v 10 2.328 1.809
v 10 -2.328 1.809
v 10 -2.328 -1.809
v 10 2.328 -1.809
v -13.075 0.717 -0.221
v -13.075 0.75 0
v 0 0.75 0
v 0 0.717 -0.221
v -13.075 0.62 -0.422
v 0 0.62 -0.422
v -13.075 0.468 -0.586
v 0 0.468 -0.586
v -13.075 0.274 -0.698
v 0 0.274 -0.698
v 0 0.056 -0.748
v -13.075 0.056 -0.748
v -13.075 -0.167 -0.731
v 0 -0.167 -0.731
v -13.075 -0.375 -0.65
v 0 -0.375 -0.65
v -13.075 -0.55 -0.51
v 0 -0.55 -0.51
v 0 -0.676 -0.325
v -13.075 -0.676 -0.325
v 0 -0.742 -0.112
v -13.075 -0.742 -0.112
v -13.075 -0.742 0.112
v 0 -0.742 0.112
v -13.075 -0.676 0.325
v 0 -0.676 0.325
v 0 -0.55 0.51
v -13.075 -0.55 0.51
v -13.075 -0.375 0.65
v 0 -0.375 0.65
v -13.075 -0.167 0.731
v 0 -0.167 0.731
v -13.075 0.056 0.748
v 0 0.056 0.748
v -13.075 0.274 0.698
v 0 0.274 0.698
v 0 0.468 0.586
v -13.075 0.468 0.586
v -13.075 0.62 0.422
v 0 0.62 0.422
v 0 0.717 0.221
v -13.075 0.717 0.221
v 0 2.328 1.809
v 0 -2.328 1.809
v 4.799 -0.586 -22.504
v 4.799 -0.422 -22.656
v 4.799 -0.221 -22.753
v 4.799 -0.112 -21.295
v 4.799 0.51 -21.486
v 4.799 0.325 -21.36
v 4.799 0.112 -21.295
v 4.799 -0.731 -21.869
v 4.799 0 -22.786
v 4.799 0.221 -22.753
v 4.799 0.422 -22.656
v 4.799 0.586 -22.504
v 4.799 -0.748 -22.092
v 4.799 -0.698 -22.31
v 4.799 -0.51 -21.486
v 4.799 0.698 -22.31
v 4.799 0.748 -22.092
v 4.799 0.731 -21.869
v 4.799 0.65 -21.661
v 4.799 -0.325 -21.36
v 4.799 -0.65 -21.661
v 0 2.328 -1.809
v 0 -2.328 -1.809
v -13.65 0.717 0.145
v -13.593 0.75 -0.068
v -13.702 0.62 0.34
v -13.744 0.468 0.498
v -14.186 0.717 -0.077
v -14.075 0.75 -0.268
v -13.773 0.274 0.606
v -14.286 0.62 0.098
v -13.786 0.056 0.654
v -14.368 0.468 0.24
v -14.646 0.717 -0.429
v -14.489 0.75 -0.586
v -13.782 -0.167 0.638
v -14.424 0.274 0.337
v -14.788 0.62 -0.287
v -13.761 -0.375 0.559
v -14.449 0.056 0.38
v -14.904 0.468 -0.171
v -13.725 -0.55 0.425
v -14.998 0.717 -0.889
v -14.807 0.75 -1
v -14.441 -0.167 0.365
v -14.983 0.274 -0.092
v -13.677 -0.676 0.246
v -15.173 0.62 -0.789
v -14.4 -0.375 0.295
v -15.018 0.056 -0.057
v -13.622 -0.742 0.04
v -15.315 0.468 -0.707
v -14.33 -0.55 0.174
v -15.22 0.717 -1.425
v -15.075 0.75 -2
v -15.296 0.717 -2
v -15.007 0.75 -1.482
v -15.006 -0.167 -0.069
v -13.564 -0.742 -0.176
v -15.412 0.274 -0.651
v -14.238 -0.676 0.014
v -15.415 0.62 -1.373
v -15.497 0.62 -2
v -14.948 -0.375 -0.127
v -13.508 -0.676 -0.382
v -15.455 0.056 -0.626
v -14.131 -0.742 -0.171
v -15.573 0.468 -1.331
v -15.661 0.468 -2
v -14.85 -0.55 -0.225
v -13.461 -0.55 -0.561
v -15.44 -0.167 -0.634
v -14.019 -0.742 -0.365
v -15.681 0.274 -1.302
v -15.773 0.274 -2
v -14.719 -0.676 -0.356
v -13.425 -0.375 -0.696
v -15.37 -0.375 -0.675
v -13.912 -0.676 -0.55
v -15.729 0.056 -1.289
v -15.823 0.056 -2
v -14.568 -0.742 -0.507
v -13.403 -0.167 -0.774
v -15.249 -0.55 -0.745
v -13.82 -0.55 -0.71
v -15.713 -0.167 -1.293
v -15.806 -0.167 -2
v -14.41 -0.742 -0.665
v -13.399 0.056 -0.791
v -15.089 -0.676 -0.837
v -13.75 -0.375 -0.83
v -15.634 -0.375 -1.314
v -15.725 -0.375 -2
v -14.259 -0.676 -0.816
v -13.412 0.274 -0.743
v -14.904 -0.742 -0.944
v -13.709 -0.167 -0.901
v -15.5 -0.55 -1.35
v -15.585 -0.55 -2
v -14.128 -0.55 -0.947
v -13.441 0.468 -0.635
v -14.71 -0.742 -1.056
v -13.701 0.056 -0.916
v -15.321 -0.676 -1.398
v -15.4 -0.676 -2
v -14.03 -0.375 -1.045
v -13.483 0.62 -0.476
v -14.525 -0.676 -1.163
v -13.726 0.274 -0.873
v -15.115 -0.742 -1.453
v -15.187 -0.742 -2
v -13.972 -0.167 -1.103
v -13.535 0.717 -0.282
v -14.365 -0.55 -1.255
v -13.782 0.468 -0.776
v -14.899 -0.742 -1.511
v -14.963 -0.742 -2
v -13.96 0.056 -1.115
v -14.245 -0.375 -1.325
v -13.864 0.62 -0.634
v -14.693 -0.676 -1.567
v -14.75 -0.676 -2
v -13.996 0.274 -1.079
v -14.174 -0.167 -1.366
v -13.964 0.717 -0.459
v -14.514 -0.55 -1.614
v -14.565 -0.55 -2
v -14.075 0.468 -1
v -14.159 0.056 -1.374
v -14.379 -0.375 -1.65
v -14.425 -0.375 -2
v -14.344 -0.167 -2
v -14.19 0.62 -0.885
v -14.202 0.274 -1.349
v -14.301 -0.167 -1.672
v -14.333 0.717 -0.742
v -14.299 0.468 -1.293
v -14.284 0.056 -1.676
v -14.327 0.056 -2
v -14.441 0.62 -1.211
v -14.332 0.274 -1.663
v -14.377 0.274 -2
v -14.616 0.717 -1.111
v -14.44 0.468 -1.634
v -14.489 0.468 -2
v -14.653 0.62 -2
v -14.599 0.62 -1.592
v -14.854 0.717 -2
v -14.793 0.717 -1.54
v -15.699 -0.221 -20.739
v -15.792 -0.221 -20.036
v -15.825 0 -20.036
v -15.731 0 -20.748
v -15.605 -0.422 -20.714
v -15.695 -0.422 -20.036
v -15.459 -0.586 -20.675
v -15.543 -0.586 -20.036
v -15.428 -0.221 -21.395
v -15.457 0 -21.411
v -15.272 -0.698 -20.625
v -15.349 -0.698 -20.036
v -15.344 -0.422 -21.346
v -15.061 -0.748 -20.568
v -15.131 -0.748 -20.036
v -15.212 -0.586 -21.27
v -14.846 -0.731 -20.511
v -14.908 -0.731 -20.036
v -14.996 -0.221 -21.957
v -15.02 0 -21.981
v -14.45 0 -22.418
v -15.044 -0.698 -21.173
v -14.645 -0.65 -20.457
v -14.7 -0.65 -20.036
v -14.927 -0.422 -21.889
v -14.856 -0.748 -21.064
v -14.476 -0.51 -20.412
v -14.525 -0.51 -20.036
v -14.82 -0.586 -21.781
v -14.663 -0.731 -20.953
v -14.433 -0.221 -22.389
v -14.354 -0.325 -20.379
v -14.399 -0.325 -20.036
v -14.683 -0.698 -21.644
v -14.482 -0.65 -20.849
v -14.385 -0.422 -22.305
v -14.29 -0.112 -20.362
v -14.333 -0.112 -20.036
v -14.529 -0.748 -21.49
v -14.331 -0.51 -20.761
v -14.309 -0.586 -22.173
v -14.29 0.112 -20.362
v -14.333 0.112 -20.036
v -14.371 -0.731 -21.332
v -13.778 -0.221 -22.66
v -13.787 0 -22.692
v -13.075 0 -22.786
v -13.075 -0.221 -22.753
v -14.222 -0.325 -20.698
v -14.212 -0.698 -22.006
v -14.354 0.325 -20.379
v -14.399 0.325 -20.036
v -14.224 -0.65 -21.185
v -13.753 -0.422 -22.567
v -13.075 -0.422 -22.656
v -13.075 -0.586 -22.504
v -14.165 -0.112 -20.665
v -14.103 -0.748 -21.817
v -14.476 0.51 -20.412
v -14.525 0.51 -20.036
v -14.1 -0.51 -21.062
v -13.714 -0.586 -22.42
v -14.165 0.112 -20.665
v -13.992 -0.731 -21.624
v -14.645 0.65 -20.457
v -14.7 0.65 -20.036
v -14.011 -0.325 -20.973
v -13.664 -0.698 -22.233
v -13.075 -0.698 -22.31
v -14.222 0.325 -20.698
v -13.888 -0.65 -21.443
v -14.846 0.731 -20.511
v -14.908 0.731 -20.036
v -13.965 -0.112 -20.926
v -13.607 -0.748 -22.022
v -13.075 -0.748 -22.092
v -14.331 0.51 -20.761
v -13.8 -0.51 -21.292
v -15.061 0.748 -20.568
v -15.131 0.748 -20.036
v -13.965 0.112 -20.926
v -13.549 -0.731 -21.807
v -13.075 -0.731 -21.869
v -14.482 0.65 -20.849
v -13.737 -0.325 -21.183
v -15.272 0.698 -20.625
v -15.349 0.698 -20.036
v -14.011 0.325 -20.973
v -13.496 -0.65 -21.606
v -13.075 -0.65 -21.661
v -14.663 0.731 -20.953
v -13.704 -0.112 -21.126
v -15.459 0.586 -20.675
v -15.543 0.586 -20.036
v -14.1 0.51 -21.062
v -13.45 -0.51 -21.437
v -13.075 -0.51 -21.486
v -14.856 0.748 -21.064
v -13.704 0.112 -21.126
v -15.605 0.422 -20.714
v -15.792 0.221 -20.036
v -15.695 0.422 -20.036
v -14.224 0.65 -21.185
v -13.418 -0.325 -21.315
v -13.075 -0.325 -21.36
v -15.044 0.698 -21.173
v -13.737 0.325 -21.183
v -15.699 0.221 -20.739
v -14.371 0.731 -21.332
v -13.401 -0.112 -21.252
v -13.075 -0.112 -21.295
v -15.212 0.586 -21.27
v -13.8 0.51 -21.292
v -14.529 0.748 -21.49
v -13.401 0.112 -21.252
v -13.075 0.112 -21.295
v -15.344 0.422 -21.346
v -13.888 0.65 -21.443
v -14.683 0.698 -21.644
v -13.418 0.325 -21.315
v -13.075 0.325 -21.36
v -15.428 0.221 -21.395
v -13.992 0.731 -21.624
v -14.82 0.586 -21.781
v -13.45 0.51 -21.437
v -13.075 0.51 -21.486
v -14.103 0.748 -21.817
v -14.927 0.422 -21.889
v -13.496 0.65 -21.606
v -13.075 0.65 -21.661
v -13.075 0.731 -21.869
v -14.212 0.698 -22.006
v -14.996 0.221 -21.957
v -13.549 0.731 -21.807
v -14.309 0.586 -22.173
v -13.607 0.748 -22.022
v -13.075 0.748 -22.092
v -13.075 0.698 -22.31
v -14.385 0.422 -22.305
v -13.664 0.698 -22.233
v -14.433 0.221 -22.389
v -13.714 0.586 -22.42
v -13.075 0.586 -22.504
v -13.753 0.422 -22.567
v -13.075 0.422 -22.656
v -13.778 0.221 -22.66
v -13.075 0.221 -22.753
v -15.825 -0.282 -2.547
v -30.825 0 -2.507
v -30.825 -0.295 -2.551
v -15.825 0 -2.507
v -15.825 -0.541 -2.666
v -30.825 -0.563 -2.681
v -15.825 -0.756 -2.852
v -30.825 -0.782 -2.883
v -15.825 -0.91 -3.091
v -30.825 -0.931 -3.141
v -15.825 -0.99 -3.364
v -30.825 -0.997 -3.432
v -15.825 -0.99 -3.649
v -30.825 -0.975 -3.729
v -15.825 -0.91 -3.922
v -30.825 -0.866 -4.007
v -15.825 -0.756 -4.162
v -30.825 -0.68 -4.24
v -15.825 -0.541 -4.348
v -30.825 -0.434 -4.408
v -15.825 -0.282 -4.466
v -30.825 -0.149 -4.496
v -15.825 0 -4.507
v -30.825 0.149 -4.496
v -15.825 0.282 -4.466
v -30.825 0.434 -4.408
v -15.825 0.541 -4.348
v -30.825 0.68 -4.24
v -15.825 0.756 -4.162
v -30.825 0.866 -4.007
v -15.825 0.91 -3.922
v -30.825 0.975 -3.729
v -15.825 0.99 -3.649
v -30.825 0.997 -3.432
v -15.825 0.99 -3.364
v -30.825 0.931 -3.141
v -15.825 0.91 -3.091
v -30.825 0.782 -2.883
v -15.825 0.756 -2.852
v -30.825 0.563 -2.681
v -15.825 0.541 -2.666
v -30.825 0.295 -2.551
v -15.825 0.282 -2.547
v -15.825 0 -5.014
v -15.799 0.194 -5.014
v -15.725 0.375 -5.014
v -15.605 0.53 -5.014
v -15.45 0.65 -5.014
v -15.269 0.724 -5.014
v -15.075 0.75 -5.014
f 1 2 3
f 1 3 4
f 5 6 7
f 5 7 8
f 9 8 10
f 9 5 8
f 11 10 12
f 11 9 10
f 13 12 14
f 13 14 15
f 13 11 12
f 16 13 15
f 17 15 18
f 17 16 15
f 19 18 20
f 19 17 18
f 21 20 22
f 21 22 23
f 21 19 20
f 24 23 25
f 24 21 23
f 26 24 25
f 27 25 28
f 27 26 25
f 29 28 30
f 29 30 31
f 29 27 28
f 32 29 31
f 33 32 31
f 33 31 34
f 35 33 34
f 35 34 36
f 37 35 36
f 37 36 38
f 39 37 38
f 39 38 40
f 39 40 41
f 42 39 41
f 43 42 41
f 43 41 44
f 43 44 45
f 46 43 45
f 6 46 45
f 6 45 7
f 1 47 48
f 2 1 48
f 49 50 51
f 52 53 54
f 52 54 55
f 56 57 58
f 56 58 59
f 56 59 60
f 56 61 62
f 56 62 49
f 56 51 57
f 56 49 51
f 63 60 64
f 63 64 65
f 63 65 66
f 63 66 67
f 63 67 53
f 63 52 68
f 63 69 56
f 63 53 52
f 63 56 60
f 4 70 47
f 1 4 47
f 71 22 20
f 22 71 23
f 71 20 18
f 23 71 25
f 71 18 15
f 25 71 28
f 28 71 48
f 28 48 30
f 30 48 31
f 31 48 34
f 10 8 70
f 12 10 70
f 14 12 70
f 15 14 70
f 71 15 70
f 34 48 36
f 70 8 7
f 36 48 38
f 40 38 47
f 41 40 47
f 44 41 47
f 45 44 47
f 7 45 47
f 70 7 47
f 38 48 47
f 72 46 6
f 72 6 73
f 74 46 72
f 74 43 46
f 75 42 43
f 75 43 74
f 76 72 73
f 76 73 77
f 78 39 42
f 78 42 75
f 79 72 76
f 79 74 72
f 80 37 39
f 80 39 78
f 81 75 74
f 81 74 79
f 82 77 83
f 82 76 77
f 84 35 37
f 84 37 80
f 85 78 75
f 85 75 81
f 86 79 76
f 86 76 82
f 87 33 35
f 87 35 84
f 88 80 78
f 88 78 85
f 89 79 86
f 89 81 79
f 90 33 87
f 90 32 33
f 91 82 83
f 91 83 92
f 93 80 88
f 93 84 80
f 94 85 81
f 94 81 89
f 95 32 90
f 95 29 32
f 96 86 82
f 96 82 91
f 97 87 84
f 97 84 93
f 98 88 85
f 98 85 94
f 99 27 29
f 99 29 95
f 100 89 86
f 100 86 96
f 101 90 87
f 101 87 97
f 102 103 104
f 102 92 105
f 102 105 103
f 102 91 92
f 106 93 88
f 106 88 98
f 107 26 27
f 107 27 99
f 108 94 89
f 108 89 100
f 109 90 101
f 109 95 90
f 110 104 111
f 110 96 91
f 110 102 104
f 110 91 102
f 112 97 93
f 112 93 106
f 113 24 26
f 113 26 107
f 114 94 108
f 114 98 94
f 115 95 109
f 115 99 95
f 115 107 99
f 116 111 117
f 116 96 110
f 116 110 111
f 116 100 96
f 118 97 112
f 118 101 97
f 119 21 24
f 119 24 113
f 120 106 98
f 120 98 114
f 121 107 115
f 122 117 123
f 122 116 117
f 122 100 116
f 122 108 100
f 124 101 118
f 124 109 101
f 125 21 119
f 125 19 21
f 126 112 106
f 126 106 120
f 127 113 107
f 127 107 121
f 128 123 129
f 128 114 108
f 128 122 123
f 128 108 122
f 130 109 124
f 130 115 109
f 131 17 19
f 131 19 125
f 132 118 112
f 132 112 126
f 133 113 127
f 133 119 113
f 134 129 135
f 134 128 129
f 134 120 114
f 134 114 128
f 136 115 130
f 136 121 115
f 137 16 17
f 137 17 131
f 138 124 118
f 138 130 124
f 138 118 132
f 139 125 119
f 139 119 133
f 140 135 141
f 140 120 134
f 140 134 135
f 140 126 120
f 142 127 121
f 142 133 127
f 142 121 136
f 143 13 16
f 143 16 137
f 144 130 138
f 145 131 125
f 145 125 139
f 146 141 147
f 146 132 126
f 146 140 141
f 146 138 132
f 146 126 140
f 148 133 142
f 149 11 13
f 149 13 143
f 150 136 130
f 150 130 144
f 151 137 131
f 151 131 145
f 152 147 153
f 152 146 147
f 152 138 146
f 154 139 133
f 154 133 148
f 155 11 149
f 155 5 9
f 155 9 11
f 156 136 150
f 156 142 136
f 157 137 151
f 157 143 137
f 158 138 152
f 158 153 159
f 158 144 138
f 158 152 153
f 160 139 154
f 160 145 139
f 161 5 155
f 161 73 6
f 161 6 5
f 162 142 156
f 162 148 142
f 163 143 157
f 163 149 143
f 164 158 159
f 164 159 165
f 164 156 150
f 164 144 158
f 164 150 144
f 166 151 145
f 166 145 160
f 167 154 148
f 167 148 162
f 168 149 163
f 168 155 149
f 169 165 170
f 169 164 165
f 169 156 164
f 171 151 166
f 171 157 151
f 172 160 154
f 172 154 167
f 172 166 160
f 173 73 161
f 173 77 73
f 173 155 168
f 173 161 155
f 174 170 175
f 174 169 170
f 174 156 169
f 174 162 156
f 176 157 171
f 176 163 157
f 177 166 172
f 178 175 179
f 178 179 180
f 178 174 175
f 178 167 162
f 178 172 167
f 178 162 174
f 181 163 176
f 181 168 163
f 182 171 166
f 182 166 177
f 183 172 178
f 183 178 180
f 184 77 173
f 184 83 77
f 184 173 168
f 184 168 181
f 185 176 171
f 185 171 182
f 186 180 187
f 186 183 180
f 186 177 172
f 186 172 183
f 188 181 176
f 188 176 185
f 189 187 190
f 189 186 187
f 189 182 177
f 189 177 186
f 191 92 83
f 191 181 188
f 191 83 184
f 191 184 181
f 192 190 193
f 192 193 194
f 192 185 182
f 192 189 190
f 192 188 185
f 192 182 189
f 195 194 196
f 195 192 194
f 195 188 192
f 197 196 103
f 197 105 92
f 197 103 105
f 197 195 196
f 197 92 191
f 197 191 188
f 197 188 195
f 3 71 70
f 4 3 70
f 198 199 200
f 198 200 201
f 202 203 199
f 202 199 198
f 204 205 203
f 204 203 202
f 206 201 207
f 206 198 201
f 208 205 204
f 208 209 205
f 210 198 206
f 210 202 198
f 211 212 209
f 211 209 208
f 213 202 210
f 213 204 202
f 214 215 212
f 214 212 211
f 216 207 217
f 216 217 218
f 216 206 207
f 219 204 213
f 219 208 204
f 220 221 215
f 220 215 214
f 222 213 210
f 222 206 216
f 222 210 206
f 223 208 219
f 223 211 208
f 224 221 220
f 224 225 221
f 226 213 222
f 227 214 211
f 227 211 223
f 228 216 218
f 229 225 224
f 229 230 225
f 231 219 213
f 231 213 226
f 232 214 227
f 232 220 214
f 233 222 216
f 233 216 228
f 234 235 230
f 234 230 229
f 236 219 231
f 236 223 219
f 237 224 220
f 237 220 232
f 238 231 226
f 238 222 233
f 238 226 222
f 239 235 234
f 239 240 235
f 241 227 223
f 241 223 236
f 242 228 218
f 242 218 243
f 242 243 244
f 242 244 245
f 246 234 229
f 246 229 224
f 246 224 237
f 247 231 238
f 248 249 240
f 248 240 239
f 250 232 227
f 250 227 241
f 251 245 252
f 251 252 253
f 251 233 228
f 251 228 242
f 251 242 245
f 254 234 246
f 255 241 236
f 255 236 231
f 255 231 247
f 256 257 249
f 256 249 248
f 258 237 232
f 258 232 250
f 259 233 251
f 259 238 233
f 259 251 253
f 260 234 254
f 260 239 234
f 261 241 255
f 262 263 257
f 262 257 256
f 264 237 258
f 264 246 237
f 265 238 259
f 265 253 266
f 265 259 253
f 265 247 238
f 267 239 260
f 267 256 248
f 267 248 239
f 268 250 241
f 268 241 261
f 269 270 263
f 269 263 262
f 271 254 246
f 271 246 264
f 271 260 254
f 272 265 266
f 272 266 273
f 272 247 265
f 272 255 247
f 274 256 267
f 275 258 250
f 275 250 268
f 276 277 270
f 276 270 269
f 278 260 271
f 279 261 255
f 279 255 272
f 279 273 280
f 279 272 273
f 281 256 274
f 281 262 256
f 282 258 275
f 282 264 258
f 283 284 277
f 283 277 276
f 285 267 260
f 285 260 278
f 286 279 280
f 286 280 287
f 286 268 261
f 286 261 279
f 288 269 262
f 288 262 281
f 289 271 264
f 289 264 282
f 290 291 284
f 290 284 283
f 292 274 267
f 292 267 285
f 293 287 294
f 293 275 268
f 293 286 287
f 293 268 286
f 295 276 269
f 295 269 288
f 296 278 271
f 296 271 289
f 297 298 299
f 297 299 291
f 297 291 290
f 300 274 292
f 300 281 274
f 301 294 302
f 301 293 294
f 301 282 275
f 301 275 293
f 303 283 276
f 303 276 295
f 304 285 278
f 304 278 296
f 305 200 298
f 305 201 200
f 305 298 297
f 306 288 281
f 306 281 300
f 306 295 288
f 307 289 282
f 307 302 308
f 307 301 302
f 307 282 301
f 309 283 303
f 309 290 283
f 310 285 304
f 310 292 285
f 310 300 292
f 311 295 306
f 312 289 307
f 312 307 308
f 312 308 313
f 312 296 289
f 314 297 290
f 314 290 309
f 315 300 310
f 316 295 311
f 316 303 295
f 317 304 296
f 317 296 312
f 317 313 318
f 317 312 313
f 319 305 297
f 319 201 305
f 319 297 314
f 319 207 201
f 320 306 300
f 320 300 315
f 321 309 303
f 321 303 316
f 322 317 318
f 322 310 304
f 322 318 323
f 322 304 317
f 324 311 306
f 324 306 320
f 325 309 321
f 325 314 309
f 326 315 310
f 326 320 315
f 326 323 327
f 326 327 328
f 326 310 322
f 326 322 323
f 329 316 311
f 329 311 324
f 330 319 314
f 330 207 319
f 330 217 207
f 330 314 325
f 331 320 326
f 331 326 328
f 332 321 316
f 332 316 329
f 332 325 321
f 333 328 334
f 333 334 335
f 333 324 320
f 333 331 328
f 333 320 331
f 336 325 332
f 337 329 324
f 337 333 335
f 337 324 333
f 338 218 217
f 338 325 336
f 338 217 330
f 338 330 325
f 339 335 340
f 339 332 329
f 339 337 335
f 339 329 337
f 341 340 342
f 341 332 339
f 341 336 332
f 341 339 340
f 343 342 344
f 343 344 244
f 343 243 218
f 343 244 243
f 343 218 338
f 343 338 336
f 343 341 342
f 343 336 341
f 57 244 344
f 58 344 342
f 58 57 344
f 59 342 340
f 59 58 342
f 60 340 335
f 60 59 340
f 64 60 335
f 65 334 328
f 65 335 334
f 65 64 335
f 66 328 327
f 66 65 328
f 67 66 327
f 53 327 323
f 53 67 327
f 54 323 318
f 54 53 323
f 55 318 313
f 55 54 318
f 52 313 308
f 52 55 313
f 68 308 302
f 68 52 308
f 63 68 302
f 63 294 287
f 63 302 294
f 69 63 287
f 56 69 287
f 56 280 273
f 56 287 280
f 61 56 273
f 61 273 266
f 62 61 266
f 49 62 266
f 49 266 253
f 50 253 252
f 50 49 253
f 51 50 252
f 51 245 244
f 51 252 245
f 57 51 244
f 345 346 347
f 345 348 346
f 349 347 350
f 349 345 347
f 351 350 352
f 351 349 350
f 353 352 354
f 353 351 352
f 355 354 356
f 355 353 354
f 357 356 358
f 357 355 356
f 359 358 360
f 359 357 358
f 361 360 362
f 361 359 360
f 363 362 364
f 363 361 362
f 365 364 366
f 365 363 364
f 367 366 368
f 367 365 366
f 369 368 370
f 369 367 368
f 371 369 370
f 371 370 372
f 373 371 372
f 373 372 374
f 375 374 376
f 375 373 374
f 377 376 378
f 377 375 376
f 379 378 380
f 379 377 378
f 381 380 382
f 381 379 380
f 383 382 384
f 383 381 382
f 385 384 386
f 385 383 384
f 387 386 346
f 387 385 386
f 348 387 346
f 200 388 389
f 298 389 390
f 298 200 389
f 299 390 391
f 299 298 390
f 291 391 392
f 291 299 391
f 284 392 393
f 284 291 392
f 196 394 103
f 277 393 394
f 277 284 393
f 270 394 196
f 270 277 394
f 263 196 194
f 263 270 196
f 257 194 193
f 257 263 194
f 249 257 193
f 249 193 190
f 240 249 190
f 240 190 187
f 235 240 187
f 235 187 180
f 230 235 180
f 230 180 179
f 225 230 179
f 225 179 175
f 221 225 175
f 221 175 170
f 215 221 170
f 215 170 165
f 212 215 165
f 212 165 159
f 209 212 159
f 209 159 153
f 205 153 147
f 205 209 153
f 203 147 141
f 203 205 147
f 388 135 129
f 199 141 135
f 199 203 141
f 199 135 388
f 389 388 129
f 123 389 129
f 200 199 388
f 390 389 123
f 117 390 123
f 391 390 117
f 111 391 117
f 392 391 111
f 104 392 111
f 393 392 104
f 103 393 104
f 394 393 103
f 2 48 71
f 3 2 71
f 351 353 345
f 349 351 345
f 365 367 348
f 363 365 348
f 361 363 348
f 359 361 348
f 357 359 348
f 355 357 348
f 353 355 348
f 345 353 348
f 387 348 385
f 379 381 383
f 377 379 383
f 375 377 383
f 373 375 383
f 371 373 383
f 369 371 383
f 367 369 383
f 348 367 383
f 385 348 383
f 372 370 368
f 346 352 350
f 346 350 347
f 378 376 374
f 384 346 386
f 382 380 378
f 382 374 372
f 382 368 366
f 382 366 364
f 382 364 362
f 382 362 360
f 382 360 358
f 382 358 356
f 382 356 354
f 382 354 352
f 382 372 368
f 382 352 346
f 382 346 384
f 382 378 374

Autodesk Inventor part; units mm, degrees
ref_plane "YZ Plane" through (0, 0, 0) normal (1, 0, 0) x (0, 1, 0)
ref_plane "XZ Plane" through (0, 0, 0) normal (0, 1, 0) x (-1, 0, 0)
ref_plane "XY Plane" through (0, 0, 0) normal (0, 0, 1) x (1, 0, 0)
sketch "草圖1" plane through (0, 0, 0) normal (1, 0, 0) x (0, 1, 0)
  circle A0 centre (0, 0) radius 0.75
  dimension "d0" = 1.5
sketch "草圖2" plane through (0, 0, 0) normal (0, 1, 0) x (-1, 0, 0)
  line L0 (0, 0) -> (13.075, 0)
  line L1 (15.075, -2) -> (15.075, -5.0136)
  arc A0 (15.075, -2) -> (13.075, 0) centre (13.075, -2) ccw
  point P0 (15.075, 0)
  dimension "d3" = 2
sweep "掃掠1" add profiles "草圖1" path "草圖2"
sketch "草圖3" plane through (0, 0, 0) normal (1, 0, 0) x (0, 1, 0)
  line L0 (-2.3279, -1.8091) -> (2.3279, -1.8091)
  line L1 (2.3279, -1.8091) -> (2.3279, 1.8091)
  line L2 (2.3279, 1.8091) -> (-2.3279, 1.8091)
  line L3 (-2.3279, 1.8091) -> (-2.3279, -1.8091)
  line L4 (-2.3279, -1.8091) -> (2.3279, 1.8091) construction
  line L5 (2.3279, -1.8091) -> (-2.3279, 1.8091) construction
  point P0 (0, 0)
sketch "草圖4" plane through (0, 0, 0) normal (0, 1, 0) x (-1, 0, 0)
  line L0 (15.825, -3.5068) -> (30.825, -3.5068)
  line L1 (30.825, -3.5068) -> (30.825, -2.5068)
  line L2 (30.825, -2.5068) -> (15.825, -2.5068)
  line L3 (15.825, -2.5068) -> (15.825, -3.5068)
  line L4 (15.825, -2) -> (15.825, -5.0136) projected
  point P0 (0, 0)
  point P1 (15.825, -3.0068)
  dimension "d4" = 1
  dimension "d5" = 15
revolve "迴轉1" add sketch "草圖4" angle 360 about axis through (-15.825, 0, -3.5068) along (-1, 0, 0)
extrude "擠出1" add sketch "草圖3" along normal blind 10
sketch "草圖5" plane through (0, 0, 0) normal (0, 1, 0) x (-1, 0, 0)
  line L0 (14.325, -5.0136) -> (15.825, -5.0136) projected
  line L1 (15.075, -5.0136) -> (15.075, -20.0362)
  line L2 (13.075, -22.0362) -> (-4.7988, -22.0362)
  arc A0 (13.075, -22.0362) -> (15.075, -20.0362) centre (13.075, -20.0362) ccw
  point P0 (0, 0)
  dimension "d9" = 2
sketch "草圖6" plane through (-15.075, 0, -5.0136) normal (0, 0, -1) x (-1, 0, 0)
  point P0 (-15.075, 0)
sketch "草圖7" plane through (-15.075, 0, -5.0136) normal (0, 0, -1) x (-1, 0, 0)
  circle A0 centre (0, 0) radius 0.75 projected
  point P0 (-15.075, 0)
sweep "掃掠2" add profiles "草圖7" path "草圖5" path curves L1 A0 L2
properties part number "槓桿"
